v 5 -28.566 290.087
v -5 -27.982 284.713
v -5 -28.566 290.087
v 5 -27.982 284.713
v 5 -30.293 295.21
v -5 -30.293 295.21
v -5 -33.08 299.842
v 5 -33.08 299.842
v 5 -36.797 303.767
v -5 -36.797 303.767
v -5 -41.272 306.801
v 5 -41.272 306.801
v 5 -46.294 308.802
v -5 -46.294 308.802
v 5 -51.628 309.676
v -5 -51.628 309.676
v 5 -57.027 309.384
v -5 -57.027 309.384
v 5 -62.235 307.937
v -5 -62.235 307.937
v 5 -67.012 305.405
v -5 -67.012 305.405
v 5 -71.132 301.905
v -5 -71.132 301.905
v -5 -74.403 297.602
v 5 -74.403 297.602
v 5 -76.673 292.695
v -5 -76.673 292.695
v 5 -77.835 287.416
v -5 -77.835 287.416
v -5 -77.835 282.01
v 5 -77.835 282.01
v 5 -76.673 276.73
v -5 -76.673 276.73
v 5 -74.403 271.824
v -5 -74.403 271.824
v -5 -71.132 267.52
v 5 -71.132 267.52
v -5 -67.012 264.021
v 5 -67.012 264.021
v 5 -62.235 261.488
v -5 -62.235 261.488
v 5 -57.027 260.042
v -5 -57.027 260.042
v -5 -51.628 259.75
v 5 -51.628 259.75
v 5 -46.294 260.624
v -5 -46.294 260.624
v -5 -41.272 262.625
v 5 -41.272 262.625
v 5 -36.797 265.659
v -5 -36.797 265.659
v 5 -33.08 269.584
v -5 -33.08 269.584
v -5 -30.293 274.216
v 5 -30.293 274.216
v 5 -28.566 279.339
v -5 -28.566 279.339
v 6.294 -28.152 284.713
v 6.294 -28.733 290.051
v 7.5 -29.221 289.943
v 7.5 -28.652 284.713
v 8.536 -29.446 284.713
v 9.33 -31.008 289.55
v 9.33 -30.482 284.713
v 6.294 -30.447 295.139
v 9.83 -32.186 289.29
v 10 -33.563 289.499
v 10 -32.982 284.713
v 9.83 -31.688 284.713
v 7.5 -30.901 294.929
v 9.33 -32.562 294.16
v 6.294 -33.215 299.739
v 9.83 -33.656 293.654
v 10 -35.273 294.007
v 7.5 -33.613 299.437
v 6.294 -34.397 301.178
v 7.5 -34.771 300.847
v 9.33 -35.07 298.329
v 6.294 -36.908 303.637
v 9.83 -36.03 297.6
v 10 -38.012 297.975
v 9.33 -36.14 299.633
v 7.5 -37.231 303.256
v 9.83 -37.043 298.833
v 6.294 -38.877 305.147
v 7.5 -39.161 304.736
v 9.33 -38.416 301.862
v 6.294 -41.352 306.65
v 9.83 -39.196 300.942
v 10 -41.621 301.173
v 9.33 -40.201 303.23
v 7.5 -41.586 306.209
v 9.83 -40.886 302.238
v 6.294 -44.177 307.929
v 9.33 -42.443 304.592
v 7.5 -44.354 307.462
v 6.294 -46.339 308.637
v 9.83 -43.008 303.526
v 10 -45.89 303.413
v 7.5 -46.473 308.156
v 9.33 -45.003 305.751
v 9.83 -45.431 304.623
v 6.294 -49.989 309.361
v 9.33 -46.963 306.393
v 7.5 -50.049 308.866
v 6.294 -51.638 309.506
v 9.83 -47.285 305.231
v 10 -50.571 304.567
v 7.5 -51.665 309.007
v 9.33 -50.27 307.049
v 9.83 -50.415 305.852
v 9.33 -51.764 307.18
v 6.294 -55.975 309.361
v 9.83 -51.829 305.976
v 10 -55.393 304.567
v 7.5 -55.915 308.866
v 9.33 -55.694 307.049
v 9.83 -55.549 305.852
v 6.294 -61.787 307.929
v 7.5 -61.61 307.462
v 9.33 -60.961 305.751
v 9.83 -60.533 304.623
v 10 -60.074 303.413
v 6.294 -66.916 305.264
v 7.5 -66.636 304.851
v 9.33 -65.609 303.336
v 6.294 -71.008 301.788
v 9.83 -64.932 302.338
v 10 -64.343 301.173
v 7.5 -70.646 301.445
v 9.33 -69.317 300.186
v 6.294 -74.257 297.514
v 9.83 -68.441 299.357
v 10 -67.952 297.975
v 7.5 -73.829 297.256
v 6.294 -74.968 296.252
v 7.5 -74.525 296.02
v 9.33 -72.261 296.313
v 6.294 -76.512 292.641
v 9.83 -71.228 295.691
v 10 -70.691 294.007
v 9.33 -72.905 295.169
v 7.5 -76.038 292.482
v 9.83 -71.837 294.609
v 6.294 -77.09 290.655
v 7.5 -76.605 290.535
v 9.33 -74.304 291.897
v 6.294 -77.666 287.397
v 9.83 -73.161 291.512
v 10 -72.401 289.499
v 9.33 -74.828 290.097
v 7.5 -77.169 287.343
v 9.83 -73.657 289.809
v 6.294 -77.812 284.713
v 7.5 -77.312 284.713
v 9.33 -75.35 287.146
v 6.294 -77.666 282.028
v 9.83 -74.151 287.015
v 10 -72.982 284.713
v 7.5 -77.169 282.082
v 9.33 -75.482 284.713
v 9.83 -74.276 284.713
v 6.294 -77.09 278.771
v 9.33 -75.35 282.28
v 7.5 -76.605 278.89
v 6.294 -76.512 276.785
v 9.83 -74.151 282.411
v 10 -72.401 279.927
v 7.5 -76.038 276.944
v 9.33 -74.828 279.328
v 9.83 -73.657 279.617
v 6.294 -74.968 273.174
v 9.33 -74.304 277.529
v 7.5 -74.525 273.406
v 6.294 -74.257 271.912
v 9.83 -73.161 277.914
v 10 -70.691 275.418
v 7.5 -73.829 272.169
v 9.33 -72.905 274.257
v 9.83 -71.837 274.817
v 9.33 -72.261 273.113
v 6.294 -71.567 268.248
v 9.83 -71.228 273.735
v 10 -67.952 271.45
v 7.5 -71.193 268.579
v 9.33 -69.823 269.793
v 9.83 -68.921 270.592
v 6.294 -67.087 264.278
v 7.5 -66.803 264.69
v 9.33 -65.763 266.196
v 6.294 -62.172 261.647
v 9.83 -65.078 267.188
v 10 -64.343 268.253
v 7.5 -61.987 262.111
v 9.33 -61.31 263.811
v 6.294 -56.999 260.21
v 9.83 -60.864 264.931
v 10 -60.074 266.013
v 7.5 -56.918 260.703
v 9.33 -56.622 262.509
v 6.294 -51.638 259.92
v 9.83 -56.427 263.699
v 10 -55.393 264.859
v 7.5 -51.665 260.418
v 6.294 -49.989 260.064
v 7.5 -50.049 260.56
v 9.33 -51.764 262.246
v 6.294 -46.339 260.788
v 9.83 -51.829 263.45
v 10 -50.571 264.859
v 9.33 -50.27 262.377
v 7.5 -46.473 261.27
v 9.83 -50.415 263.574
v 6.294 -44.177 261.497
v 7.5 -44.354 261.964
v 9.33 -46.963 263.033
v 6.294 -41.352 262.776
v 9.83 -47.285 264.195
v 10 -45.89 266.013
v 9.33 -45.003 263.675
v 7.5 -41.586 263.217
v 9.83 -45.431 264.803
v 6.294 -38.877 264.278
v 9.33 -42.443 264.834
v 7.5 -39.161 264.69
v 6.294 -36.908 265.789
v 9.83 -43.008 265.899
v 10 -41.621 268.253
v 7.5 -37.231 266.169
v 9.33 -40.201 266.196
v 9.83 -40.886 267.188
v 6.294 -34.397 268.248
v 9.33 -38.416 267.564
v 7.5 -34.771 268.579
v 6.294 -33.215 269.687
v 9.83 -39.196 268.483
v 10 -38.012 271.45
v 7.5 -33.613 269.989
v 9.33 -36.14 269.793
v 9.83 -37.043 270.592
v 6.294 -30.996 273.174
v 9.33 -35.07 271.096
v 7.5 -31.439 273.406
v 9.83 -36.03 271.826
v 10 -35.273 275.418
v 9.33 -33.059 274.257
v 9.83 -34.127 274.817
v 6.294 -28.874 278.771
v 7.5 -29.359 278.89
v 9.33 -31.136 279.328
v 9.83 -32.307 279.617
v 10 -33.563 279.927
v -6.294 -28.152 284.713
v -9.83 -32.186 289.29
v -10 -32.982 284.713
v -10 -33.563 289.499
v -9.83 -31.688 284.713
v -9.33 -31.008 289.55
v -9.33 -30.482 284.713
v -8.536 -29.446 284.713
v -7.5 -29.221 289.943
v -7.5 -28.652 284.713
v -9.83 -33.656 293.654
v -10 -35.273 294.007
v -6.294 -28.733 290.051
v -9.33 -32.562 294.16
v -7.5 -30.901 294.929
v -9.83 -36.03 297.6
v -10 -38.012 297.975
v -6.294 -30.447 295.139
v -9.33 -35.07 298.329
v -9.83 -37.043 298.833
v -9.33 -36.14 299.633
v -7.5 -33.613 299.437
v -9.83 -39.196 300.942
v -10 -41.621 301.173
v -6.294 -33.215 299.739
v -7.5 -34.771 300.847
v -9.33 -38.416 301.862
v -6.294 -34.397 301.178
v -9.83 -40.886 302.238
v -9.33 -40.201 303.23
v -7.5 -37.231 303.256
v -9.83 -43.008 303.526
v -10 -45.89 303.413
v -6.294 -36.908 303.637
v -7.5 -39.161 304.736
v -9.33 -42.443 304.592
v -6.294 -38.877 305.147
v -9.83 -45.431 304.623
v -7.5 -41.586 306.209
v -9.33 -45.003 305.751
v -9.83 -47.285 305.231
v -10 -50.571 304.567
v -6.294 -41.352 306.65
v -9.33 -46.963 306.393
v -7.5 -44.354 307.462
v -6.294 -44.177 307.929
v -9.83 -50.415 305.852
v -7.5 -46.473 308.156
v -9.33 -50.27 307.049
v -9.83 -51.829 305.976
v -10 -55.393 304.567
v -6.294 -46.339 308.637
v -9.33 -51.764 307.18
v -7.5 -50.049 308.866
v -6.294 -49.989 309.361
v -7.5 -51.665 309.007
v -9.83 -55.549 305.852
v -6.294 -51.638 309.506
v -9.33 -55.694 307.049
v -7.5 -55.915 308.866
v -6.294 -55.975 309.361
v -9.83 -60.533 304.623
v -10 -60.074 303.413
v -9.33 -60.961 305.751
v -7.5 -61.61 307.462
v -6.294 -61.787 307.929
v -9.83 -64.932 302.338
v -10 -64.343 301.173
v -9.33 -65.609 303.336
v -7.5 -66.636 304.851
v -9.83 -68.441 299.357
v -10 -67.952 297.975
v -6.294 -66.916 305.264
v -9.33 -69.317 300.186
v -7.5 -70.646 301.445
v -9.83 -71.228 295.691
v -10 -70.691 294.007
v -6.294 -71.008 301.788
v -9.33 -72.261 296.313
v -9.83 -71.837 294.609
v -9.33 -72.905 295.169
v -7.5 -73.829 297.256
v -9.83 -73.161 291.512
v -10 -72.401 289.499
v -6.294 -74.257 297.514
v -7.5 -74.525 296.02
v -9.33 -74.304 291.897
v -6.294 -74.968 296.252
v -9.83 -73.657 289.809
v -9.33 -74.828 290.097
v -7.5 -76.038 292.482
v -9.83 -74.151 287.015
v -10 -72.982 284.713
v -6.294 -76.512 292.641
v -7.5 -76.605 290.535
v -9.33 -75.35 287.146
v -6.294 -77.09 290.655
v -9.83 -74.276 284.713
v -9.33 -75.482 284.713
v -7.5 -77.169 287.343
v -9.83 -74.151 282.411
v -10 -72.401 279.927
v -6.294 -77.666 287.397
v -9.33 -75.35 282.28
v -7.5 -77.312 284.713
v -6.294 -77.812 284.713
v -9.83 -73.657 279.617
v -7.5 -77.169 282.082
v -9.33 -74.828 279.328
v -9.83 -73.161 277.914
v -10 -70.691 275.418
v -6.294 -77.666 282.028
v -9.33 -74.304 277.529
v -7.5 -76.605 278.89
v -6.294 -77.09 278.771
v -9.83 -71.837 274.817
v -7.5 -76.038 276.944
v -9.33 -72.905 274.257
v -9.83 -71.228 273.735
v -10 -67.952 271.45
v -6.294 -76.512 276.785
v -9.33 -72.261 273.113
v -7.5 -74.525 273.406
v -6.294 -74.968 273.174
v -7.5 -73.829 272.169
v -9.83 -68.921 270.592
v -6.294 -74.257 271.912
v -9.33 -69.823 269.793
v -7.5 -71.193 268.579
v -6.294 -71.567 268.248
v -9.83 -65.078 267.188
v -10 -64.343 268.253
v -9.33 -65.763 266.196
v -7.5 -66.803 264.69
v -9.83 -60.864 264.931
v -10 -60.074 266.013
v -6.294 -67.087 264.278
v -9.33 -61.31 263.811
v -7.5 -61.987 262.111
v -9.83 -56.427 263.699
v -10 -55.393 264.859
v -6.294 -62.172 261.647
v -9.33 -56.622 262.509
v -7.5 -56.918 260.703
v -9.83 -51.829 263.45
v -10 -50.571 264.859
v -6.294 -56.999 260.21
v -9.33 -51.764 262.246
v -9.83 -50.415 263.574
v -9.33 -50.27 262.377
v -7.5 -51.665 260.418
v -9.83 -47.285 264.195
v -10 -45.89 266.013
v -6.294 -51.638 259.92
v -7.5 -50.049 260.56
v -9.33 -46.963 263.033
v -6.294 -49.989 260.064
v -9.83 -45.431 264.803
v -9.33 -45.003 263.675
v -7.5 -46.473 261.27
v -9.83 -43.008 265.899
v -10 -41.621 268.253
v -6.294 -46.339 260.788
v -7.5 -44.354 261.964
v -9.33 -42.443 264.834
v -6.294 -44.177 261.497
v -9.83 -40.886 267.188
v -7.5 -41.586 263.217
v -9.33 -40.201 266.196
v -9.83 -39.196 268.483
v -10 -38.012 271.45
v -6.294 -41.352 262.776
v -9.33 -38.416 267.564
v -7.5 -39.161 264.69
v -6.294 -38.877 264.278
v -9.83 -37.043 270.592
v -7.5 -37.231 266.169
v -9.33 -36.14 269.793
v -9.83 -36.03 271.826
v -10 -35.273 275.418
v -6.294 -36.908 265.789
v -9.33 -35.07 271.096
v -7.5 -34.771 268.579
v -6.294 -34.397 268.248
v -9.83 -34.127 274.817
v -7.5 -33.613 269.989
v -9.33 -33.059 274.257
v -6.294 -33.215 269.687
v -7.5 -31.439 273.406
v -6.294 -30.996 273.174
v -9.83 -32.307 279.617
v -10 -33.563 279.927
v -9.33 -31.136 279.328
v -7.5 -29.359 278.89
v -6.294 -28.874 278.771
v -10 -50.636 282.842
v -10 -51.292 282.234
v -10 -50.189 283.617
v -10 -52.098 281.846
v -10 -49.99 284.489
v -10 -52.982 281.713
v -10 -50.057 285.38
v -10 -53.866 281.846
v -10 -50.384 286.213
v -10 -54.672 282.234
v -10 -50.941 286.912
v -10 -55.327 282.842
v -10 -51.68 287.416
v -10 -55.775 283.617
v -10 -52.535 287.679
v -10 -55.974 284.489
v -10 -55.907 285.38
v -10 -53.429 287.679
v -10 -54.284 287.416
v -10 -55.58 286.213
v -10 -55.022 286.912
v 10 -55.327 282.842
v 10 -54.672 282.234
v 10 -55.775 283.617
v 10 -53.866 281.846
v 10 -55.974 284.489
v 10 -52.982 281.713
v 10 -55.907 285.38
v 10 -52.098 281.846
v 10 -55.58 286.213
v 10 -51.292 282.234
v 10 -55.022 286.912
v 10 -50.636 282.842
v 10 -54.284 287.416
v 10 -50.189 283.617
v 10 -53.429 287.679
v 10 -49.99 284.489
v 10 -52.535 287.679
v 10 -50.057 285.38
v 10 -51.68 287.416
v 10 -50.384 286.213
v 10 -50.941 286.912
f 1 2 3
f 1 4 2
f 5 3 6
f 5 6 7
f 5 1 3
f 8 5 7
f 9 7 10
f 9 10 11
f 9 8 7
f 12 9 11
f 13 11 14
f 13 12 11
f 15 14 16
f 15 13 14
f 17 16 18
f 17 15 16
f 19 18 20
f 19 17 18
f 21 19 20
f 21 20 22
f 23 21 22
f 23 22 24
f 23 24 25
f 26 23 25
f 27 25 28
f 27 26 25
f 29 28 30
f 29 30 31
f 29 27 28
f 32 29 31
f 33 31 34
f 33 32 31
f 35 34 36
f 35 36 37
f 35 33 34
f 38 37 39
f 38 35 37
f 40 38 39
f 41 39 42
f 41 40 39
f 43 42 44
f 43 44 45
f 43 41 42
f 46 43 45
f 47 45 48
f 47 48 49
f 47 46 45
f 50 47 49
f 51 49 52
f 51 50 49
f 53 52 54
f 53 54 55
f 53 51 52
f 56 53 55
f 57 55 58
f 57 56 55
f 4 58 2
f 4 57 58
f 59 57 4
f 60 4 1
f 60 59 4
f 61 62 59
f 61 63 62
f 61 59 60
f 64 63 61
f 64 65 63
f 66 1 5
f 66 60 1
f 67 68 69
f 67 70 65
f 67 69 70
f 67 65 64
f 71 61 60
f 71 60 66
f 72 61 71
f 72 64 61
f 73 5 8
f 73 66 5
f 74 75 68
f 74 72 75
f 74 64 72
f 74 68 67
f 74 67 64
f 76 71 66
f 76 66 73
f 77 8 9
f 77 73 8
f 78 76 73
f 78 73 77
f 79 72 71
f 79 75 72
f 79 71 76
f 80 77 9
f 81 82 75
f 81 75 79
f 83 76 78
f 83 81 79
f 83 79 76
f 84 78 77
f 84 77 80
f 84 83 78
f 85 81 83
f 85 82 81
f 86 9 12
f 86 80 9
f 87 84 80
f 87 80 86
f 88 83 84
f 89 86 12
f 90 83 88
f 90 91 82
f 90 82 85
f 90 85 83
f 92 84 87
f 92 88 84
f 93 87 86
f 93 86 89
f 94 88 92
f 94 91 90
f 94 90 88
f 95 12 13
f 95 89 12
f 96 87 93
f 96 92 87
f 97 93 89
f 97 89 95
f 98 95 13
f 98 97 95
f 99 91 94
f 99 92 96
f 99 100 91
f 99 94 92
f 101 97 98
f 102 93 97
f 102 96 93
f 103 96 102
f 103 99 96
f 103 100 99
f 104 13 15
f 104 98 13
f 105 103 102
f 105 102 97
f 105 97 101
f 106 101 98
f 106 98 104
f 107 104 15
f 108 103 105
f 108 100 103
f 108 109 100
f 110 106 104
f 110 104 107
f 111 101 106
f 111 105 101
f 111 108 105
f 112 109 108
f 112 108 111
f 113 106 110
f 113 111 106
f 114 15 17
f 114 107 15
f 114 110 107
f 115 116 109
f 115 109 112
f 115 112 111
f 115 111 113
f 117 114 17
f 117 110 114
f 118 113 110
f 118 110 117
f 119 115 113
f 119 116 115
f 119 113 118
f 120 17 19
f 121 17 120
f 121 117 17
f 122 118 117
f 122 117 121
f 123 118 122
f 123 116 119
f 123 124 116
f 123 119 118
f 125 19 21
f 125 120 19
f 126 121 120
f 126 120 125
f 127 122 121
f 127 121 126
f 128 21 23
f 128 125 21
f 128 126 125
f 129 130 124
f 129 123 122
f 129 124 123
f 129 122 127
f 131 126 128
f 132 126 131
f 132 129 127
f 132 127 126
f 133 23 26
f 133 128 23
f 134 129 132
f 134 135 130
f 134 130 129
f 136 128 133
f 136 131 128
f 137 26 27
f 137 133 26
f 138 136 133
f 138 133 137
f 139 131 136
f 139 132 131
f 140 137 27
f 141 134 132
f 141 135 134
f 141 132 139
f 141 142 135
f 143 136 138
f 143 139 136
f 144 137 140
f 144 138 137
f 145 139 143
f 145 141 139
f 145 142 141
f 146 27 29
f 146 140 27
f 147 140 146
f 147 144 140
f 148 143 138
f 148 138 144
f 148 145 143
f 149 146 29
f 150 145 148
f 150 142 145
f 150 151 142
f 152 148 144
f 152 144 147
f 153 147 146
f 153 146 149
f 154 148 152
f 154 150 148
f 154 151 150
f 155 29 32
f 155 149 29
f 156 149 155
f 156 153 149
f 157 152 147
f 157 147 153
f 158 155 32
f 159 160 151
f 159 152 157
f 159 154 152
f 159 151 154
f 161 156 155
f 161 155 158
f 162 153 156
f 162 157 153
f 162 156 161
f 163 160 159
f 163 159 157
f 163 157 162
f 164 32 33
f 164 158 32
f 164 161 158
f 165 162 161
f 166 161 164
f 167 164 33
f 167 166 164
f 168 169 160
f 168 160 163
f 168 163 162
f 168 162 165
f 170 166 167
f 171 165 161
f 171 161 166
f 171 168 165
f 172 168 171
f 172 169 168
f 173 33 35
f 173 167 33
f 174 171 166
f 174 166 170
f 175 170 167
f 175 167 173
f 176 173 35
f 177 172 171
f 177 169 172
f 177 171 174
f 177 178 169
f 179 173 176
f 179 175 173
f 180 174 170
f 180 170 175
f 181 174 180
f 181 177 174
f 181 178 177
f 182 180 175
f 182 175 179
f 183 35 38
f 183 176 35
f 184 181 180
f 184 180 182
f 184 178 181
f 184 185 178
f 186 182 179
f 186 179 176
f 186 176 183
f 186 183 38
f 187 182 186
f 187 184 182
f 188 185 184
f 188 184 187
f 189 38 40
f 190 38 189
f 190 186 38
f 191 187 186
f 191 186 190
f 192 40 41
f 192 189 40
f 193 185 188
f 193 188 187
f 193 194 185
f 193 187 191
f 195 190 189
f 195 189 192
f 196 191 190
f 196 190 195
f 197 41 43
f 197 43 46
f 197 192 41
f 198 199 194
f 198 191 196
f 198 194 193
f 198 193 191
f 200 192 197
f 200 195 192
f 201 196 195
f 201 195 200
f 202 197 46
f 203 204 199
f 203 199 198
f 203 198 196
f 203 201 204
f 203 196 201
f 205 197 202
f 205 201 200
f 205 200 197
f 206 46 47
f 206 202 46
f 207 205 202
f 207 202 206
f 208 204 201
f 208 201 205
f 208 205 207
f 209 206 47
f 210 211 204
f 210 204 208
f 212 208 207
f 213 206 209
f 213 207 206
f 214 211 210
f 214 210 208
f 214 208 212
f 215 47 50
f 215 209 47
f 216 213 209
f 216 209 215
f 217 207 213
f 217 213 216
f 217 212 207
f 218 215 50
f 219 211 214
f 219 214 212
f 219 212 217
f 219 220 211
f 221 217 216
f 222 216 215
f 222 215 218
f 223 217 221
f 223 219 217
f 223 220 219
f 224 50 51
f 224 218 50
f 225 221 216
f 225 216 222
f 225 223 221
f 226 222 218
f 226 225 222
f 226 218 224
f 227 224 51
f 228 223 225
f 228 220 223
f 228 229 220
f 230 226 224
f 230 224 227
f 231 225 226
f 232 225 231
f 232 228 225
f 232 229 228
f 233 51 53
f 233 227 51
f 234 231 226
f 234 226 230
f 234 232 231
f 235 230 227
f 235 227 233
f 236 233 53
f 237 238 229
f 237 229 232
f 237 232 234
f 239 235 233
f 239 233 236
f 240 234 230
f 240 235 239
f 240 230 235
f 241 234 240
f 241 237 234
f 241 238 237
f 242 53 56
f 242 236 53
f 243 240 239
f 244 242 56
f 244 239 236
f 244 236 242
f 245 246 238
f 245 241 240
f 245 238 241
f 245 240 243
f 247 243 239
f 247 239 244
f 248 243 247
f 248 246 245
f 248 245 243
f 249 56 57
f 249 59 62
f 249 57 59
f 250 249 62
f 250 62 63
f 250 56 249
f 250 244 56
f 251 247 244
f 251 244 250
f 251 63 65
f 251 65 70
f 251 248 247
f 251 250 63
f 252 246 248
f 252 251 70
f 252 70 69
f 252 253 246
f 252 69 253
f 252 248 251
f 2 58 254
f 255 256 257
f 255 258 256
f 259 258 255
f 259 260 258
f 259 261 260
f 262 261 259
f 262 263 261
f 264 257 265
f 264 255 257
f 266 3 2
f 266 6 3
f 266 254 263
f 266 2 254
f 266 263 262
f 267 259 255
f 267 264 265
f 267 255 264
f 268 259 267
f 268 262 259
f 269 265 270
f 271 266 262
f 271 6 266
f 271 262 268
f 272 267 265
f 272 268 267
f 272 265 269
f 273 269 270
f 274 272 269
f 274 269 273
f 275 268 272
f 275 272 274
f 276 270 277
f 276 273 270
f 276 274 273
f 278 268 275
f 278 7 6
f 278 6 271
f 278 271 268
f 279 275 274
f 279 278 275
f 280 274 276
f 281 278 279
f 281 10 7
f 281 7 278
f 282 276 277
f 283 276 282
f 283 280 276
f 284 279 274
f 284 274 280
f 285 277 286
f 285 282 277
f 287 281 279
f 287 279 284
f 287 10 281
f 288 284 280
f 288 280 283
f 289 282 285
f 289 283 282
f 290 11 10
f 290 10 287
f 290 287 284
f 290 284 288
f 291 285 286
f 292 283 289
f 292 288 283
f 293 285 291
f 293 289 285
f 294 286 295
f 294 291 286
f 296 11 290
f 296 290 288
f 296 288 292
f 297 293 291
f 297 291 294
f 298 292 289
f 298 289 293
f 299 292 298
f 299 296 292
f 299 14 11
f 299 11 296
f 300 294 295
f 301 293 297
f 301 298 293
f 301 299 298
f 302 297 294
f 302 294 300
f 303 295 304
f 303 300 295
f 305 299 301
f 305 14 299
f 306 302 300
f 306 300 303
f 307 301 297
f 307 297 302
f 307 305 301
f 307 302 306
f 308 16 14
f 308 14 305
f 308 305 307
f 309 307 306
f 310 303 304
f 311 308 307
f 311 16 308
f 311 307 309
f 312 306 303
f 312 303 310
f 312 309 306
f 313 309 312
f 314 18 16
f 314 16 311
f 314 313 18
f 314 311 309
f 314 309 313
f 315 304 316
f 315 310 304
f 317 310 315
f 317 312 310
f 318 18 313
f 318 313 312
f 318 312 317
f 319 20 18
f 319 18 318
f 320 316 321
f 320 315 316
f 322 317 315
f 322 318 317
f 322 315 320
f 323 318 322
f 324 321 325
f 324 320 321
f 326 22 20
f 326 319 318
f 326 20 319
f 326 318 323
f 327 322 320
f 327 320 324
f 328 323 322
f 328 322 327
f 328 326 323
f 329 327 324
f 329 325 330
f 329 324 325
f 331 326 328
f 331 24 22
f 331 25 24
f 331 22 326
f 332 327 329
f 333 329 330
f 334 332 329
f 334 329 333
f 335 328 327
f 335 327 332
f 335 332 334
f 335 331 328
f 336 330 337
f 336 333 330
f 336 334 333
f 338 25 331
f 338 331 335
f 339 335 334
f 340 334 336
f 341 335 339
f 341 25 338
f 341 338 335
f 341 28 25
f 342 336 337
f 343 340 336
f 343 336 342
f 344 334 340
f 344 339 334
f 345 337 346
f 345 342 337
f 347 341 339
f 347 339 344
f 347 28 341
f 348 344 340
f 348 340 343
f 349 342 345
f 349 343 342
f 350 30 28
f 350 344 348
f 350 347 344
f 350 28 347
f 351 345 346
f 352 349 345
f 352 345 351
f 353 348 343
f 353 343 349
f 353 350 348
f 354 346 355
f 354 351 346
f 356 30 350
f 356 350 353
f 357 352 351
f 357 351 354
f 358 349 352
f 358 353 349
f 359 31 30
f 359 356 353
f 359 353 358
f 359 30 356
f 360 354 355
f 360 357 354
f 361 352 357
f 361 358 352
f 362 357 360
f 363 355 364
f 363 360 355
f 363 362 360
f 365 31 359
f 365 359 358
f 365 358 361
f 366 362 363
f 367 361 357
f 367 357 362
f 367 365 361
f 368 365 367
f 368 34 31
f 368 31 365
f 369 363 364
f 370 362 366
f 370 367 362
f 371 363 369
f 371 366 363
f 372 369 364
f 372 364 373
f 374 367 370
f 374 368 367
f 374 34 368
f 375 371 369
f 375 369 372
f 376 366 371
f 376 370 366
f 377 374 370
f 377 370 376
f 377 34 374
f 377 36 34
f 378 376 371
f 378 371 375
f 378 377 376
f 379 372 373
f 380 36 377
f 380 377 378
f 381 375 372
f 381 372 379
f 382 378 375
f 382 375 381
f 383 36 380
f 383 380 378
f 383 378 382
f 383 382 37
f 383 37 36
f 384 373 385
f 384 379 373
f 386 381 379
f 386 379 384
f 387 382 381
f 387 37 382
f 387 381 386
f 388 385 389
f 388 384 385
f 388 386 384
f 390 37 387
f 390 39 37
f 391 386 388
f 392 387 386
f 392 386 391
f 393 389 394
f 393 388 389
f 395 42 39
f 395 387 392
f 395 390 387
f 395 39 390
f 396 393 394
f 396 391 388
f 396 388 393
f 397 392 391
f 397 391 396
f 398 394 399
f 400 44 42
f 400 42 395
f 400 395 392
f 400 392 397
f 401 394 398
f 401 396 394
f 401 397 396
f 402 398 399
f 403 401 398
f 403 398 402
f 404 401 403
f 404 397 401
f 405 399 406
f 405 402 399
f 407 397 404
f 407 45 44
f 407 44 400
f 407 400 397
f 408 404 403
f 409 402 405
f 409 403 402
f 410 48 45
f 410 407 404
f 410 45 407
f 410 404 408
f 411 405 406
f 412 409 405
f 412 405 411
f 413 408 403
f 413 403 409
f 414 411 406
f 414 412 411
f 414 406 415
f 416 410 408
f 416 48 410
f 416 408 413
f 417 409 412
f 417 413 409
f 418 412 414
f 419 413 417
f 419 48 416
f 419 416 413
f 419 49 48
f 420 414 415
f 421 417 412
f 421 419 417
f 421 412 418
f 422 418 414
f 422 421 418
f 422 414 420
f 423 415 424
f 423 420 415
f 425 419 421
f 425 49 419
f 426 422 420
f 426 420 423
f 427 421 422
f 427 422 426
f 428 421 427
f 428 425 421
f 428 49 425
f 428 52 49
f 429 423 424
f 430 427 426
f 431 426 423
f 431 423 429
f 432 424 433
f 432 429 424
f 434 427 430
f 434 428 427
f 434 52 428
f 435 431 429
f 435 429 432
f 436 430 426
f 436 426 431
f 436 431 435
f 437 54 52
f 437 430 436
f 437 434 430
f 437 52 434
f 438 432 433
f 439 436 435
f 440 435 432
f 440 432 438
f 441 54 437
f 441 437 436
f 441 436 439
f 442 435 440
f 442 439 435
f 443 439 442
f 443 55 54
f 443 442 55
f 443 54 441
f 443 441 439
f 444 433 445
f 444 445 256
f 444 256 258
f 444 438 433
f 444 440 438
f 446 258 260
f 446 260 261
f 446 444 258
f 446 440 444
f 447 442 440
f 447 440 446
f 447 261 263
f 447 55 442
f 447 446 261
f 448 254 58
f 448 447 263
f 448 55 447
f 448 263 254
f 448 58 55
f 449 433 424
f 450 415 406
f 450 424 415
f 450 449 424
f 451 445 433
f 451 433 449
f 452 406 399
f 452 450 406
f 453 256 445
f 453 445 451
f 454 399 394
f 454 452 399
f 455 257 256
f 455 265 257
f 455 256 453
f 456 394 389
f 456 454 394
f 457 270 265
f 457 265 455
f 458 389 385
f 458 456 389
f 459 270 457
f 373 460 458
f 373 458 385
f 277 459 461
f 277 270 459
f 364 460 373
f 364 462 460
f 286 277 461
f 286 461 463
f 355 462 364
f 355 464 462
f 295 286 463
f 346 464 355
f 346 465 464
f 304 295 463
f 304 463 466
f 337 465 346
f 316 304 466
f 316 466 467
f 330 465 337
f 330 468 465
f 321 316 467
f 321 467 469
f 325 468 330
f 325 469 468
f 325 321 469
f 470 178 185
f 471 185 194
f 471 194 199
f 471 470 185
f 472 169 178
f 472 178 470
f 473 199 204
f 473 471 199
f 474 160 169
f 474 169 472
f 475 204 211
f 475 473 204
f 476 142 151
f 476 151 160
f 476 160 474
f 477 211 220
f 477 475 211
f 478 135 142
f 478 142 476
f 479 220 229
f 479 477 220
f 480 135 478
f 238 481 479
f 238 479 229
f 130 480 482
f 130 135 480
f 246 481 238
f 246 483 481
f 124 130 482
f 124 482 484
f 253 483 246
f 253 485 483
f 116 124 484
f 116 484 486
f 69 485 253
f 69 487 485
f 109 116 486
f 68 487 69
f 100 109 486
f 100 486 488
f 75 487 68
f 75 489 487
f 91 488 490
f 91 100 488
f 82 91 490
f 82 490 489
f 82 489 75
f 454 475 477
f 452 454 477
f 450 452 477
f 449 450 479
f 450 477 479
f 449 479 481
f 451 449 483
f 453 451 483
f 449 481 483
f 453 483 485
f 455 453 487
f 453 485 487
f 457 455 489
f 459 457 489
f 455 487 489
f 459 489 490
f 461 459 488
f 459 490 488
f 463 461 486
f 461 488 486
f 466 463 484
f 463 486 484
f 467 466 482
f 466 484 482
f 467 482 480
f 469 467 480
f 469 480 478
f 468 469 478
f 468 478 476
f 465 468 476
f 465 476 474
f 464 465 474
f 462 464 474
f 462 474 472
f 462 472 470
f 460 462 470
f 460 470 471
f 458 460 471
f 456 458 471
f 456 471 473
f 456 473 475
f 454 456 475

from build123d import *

# Parameters (mm, degrees)
SKETCH5_R      = 2
EXTRUDE4_DEPTH = 100
SKETCH6_R      = 3
EXTRUDE5_DEPTH = 100


with BuildPart() as part:
    # Fillet4: read off the stored shape, not the designer's step
    # Fillet4 outline → Fillet4 (revolve)
    with BuildSketch(Plane(origin=(0, -52.981969609, 284.712869435), x_dir=(0, 1, 0), z_dir=(0, 0, -1))):
        with BuildLine():
            Line((25, -5), (25, 5))
            ThreePointArc((25, 5), (23.535533906, 8.535533906), (20, 10))
            Line((20, 10), (0, 10))
            Line((0, 10), (0, -10))
            Line((0, -10), (20, -10))
            ThreePointArc((20, -10), (23.535533906, -8.535533906), (25, -5))
        make_face()
    revolve(axis=Axis((0, -52.981969609, 284.712869435), (1, 0, 0)))

    # Sketch5 → Extrude4 (cut)
    with BuildSketch(Plane(origin=(10, 0, 0), x_dir=(0, 0, -1), z_dir=(1, 0, 0))):
        with Locations((-284.712869435, -52.981969609)):
            Circle(SKETCH5_R)
    extrude(amount=-EXTRUDE4_DEPTH, mode=Mode.SUBTRACT)

    # Sketch6 → Extrude5 (cut)
    with BuildSketch(Plane(origin=(10, 0, 0), x_dir=(0, 0, -1), z_dir=(1, 0, 0))):
        with Locations((-284.712869435, -52.981969609)):
            Circle(SKETCH6_R)
    extrude(amount=-EXTRUDE5_DEPTH, mode=Mode.SUBTRACT)


solid = part.part
